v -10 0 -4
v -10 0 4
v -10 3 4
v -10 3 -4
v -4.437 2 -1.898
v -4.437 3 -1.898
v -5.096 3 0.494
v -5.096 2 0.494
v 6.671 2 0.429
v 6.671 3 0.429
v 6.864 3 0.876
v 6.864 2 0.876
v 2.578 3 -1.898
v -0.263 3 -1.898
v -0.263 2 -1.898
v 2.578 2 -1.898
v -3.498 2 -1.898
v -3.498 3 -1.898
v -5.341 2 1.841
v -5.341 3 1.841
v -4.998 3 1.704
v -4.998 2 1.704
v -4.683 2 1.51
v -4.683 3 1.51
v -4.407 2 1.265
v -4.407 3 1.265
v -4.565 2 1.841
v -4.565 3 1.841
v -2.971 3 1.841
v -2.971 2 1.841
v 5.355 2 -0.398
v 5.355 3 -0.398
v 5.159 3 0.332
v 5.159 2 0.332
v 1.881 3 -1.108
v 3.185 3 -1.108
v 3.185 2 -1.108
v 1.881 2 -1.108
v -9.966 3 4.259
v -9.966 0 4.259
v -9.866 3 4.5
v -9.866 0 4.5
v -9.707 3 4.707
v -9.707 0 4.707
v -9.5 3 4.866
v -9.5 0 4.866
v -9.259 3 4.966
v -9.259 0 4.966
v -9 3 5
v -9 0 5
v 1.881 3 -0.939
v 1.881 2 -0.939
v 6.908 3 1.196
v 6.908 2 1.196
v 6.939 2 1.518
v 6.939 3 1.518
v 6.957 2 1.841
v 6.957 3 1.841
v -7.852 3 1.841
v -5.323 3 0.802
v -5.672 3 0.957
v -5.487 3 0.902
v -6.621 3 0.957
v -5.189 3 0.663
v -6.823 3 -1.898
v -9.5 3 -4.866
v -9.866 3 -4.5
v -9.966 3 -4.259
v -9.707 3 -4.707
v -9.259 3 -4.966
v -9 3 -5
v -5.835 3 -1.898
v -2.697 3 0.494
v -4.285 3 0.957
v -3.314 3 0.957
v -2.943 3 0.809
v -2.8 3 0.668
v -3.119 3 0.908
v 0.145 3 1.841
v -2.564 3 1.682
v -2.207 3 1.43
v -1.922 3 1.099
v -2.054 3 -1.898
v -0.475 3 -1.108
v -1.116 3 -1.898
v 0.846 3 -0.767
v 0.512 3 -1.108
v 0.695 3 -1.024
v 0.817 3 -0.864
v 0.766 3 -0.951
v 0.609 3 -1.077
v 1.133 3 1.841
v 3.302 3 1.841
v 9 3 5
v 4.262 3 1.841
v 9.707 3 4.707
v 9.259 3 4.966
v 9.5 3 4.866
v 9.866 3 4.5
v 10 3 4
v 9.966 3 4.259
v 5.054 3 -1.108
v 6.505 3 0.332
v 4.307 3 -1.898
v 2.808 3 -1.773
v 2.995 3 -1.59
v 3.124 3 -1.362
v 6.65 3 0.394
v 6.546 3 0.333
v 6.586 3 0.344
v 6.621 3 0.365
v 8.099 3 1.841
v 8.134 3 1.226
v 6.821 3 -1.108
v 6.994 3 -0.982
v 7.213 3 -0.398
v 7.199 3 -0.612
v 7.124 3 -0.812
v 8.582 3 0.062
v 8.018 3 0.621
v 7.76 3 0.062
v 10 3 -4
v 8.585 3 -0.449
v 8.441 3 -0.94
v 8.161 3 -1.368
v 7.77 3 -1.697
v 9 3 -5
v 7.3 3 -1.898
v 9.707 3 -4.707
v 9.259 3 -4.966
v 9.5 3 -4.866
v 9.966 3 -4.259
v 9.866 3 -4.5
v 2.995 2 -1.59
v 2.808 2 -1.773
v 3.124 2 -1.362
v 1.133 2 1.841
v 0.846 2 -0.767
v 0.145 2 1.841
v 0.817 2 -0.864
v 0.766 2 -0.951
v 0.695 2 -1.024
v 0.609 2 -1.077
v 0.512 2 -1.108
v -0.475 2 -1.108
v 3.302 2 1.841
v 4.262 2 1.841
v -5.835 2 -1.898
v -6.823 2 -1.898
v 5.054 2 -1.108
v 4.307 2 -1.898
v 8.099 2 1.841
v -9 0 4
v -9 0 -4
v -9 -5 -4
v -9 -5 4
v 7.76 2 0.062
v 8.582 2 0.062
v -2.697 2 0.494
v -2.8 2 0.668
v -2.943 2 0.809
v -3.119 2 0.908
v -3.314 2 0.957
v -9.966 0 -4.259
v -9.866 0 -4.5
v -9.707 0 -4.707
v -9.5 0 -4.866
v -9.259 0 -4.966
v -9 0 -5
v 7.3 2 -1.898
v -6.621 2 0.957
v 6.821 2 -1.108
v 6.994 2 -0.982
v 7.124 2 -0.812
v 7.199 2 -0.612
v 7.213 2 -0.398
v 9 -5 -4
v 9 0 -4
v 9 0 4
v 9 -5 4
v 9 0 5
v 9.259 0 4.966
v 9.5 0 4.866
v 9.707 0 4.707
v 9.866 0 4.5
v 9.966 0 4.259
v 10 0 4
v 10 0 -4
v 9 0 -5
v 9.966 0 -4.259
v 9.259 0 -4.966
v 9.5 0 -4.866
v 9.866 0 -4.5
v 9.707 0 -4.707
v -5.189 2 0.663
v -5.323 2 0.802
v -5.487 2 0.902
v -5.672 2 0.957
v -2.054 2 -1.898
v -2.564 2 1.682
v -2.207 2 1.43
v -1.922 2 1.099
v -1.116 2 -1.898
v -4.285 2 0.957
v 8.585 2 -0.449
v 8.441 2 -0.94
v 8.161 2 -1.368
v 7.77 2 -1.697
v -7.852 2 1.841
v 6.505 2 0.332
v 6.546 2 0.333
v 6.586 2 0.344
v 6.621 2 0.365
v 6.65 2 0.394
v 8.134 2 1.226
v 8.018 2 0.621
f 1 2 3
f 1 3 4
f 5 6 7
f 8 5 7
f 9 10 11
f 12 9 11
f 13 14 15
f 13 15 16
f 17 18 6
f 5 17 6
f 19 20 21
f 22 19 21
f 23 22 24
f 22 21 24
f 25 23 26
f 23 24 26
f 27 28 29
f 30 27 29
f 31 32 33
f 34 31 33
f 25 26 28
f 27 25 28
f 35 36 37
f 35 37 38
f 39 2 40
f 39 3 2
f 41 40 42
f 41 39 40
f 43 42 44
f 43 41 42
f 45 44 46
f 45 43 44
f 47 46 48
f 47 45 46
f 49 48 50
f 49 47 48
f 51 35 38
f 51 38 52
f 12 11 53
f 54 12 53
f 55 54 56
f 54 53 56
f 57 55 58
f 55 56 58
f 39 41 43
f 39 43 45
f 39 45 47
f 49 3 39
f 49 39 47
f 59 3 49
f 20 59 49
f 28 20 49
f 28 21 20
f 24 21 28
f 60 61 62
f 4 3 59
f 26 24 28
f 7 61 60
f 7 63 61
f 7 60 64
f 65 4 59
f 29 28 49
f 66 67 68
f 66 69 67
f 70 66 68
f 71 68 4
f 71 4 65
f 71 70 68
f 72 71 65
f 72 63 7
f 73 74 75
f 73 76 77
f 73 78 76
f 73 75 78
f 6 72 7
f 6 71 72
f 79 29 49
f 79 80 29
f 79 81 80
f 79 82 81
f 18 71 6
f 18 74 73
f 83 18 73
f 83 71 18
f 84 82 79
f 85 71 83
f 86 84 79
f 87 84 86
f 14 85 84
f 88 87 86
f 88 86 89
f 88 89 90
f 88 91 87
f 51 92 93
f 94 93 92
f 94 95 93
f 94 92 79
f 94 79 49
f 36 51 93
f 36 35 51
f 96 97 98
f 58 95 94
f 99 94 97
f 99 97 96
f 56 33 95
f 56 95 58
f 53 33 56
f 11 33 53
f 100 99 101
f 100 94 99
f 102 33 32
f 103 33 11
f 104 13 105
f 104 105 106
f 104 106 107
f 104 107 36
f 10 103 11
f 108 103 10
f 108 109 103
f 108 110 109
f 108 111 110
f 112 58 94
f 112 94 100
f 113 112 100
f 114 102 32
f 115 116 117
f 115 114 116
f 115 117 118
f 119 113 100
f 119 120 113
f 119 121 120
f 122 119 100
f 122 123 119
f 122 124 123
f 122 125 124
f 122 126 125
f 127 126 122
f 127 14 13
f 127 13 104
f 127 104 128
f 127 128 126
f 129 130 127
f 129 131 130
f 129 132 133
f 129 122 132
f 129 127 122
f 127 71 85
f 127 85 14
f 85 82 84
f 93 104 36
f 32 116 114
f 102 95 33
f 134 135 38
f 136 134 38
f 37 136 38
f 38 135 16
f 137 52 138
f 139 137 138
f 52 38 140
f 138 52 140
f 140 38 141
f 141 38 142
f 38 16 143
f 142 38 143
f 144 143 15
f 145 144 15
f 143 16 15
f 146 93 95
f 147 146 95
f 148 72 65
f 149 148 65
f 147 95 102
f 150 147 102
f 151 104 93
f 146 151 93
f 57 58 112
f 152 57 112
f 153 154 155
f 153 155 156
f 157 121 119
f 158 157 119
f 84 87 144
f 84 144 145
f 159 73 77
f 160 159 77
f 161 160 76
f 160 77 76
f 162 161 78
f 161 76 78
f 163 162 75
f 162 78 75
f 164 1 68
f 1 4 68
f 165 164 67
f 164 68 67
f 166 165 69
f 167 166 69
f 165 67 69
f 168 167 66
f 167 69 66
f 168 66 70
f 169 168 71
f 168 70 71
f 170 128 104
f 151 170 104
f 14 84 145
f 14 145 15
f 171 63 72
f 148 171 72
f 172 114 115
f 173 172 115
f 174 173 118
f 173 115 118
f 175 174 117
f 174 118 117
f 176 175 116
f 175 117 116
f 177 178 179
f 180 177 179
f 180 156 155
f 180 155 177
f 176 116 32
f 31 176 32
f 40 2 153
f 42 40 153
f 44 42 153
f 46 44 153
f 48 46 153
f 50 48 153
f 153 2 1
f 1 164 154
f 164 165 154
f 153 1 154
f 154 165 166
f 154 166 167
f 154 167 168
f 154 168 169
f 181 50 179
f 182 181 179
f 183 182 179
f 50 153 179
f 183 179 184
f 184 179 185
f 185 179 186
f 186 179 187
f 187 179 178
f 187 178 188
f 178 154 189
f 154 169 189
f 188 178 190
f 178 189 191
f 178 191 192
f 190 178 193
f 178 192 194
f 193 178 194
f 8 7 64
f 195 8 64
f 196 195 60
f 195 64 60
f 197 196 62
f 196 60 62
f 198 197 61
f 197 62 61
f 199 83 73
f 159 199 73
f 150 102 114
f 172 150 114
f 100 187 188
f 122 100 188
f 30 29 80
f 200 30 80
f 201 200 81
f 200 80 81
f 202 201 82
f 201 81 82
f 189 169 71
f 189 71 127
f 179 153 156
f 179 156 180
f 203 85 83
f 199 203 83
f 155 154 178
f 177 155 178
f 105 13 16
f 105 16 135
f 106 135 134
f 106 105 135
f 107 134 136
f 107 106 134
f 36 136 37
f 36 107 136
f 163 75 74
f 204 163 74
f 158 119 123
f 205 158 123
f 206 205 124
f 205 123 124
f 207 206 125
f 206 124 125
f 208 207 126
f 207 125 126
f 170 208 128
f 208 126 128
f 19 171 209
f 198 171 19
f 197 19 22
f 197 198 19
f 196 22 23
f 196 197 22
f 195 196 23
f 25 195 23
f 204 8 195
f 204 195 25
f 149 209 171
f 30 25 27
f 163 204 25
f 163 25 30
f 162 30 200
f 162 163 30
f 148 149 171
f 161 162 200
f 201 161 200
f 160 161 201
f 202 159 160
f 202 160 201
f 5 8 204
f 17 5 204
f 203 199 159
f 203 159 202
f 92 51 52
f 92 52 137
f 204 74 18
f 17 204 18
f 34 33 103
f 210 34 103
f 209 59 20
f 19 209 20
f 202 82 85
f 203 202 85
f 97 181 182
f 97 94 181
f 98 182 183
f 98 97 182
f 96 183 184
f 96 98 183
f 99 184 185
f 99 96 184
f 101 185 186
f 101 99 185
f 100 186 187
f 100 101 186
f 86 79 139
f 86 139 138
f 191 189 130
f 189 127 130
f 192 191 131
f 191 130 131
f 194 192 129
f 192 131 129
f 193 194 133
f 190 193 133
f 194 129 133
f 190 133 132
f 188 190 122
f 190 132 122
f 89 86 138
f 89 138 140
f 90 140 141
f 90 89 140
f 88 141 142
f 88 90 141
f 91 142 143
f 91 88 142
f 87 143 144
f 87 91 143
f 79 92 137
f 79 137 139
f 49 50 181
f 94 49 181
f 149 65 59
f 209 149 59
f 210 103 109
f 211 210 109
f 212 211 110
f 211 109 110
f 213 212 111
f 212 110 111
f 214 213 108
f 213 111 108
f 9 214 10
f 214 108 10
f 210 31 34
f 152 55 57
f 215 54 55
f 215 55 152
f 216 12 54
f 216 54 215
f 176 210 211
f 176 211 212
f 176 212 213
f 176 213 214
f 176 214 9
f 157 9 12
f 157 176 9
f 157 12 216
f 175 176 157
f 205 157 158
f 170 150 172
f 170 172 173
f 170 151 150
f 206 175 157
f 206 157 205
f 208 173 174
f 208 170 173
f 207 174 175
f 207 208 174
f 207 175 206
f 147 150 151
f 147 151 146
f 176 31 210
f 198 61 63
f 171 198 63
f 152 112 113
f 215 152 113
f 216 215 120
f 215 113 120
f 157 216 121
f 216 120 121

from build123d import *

# Parameters (mm, degrees)
SKETCH_1_W          = 20
SKETCH_1_H          = 10
EXTRUDE_1_DEPTH     = 3
SKETCH_2_W          = 18
SKETCH_2_H          = 8
EXTRUDE_2_DEPTH     = 5
FILLET_1_R          = 1
CUT_EXTRUDE_1_DEPTH = 1


with BuildPart() as part:
    # 草图1 → 凸台-拉伸1 (new body)
    with BuildSketch(Plane(origin=(0, 0, 0), x_dir=(1, 0, 0), z_dir=(0, 1, 0))):
        Rectangle(SKETCH_1_W, SKETCH_1_H)
    extrude(amount=EXTRUDE_1_DEPTH)

    # 草图2 → 凸台-拉伸2 (add)
    with BuildSketch(Plane.XZ):
        Rectangle(SKETCH_2_W, SKETCH_2_H)
    extrude(amount=EXTRUDE_2_DEPTH)

    # 圆角1
    fillet_1_edges = [part.edges().sort_by_distance(p)[0] for p in [
        (10, 1.5, 5),
        (-10, 1.5, 5),
        (-10, 1.5, -5),
        (10, 1.5, -5),
    ]]
    fillet(fillet_1_edges, radius=FILLET_1_R)

    # 草图5 → 切除-拉伸1 (cut)
    with BuildSketch(Plane(origin=(0, 3, 0), x_dir=(1, 0, 0), z_dir=(0, 1, 0))):
        with BuildLine():
            Line((-6.822522061, 1.898386801), (-7.8524835, -1.840514313))
            Line((-7.8524835, -1.840514313), (-5.341070676, -1.840514313))
            ThreePointArc((-5.341070676, -1.840514313), (-4.836499754, -1.613465195), (-4.406580176, -1.265166079))
            Line((-4.406580176, -1.265166079), (-4.565072331, -1.840514313))
            Line((-4.565072331, -1.840514313), (-2.97074846, -1.840514313))
            ThreePointArc((-2.97074846, -1.840514313), (-2.37793404, -1.566363371), (-1.921561777, -1.099124639))
            Line((-1.921561777, -1.099124639), (-1.115765348, 1.898386801))
            Line((-1.115765348, 1.898386801), (-2.05428464, 1.898386801))
            Line((-2.05428464, 1.898386801), (-2.697465694, -0.49420579))
            ThreePointArc((-2.697465694, -0.49420579), (-2.943387046, -0.808990294), (-3.314394459, -0.957044663))
            Line((-3.314394459, -0.957044663), (-4.284751028, -0.957044663))
            Line((-4.284751028, -0.957044663), (-3.498160474, 1.898386801))
            Line((-3.498160474, 1.898386801), (-4.436679766, 1.898386801))
            Line((-4.436679766, 1.898386801), (-5.09577131, -0.49420579))
            ThreePointArc((-5.09577131, -0.49420579), (-5.322706757, -0.801733869), (-5.671922697, -0.957044663))
            Line((-5.671922697, -0.957044663), (-6.621478358, -0.957044663))
            Line((-6.621478358, -0.957044663), (-5.834887804, 1.898386801))
            Line((-5.834887804, 1.898386801), (-6.822522061, 1.898386801))
        make_face()
        with BuildLine():
            Line((-0.475088321, 1.107844934), (-0.262573431, 1.898386801))
            Line((-0.262573431, 1.898386801), (2.578248558, 1.898386801))
            ThreePointArc((2.578248558, 1.898386801), (2.994614434, 1.589766994), (3.185291795, 1.107844934))
            Line((3.185291795, 1.107844934), (1.880601852, 1.107844934))
            Line((1.880601852, 1.107844934), (1.880601852, 0.939138509))
            Line((1.880601852, 0.939138509), (1.13337057, -1.840514313))
            Line((1.13337057, -1.840514313), (0.14506348, -1.840514313))
            Line((0.14506348, -1.840514313), (0.846029375, 0.767034213))
            ThreePointArc((0.846029375, 0.767034213), (0.732607363, 0.989649387), (0.512489482, 1.107844934))
            Line((0.512489482, 1.107844934), (-0.475088321, 1.107844934))
        make_face()
        with BuildLine():
            Line((4.307003713, 1.898386801), (3.301905576, -1.840514313))
            Line((3.301905576, -1.840514313), (4.261825646, -1.840514313))
            Line((4.261825646, -1.840514313), (5.054408893, 1.107844934))
            Line((5.054408893, 1.107844934), (6.821228484, 1.107844934))
            ThreePointArc((6.821228484, 1.107844934), (7.123952053, 0.812017942), (7.213476308, 0.398326541))
            Line((7.213476308, 0.398326541), (5.355376817, 0.398326541))
            Line((5.355376817, 0.398326541), (5.159115285, -0.331753873))
            Line((5.159115285, -0.331753873), (6.505334941, -0.331753873))
            ThreePointArc((6.505334941, -0.331753873), (6.603923501, -0.353634595), (6.670750012, -0.42934911))
            Line((6.670750012, -0.42934911), (6.864004091, -0.875832672))
            ThreePointArc((6.864004091, -0.875832672), (6.92537385, -1.35673953), (6.9569905, -1.840514313))
            Line((6.9569905, -1.840514313), (8.099394952, -1.840514313))
            ThreePointArc((8.099394952, -1.840514313), (8.094576963, -0.91999968), (7.760433181, -0.062259431))
            Line((7.760433181, -0.062259431), (8.581825646, -0.062259431))
            ThreePointArc((8.581825646, -0.062259431), (8.316855125, 1.163927045), (7.299844055, 1.898386801))
            Line((7.299844055, 1.898386801), (4.307003713, 1.898386801))
        make_face()
    extrude(amount=-CUT_EXTRUDE_1_DEPTH, mode=Mode.SUBTRACT)


solid = part.part
